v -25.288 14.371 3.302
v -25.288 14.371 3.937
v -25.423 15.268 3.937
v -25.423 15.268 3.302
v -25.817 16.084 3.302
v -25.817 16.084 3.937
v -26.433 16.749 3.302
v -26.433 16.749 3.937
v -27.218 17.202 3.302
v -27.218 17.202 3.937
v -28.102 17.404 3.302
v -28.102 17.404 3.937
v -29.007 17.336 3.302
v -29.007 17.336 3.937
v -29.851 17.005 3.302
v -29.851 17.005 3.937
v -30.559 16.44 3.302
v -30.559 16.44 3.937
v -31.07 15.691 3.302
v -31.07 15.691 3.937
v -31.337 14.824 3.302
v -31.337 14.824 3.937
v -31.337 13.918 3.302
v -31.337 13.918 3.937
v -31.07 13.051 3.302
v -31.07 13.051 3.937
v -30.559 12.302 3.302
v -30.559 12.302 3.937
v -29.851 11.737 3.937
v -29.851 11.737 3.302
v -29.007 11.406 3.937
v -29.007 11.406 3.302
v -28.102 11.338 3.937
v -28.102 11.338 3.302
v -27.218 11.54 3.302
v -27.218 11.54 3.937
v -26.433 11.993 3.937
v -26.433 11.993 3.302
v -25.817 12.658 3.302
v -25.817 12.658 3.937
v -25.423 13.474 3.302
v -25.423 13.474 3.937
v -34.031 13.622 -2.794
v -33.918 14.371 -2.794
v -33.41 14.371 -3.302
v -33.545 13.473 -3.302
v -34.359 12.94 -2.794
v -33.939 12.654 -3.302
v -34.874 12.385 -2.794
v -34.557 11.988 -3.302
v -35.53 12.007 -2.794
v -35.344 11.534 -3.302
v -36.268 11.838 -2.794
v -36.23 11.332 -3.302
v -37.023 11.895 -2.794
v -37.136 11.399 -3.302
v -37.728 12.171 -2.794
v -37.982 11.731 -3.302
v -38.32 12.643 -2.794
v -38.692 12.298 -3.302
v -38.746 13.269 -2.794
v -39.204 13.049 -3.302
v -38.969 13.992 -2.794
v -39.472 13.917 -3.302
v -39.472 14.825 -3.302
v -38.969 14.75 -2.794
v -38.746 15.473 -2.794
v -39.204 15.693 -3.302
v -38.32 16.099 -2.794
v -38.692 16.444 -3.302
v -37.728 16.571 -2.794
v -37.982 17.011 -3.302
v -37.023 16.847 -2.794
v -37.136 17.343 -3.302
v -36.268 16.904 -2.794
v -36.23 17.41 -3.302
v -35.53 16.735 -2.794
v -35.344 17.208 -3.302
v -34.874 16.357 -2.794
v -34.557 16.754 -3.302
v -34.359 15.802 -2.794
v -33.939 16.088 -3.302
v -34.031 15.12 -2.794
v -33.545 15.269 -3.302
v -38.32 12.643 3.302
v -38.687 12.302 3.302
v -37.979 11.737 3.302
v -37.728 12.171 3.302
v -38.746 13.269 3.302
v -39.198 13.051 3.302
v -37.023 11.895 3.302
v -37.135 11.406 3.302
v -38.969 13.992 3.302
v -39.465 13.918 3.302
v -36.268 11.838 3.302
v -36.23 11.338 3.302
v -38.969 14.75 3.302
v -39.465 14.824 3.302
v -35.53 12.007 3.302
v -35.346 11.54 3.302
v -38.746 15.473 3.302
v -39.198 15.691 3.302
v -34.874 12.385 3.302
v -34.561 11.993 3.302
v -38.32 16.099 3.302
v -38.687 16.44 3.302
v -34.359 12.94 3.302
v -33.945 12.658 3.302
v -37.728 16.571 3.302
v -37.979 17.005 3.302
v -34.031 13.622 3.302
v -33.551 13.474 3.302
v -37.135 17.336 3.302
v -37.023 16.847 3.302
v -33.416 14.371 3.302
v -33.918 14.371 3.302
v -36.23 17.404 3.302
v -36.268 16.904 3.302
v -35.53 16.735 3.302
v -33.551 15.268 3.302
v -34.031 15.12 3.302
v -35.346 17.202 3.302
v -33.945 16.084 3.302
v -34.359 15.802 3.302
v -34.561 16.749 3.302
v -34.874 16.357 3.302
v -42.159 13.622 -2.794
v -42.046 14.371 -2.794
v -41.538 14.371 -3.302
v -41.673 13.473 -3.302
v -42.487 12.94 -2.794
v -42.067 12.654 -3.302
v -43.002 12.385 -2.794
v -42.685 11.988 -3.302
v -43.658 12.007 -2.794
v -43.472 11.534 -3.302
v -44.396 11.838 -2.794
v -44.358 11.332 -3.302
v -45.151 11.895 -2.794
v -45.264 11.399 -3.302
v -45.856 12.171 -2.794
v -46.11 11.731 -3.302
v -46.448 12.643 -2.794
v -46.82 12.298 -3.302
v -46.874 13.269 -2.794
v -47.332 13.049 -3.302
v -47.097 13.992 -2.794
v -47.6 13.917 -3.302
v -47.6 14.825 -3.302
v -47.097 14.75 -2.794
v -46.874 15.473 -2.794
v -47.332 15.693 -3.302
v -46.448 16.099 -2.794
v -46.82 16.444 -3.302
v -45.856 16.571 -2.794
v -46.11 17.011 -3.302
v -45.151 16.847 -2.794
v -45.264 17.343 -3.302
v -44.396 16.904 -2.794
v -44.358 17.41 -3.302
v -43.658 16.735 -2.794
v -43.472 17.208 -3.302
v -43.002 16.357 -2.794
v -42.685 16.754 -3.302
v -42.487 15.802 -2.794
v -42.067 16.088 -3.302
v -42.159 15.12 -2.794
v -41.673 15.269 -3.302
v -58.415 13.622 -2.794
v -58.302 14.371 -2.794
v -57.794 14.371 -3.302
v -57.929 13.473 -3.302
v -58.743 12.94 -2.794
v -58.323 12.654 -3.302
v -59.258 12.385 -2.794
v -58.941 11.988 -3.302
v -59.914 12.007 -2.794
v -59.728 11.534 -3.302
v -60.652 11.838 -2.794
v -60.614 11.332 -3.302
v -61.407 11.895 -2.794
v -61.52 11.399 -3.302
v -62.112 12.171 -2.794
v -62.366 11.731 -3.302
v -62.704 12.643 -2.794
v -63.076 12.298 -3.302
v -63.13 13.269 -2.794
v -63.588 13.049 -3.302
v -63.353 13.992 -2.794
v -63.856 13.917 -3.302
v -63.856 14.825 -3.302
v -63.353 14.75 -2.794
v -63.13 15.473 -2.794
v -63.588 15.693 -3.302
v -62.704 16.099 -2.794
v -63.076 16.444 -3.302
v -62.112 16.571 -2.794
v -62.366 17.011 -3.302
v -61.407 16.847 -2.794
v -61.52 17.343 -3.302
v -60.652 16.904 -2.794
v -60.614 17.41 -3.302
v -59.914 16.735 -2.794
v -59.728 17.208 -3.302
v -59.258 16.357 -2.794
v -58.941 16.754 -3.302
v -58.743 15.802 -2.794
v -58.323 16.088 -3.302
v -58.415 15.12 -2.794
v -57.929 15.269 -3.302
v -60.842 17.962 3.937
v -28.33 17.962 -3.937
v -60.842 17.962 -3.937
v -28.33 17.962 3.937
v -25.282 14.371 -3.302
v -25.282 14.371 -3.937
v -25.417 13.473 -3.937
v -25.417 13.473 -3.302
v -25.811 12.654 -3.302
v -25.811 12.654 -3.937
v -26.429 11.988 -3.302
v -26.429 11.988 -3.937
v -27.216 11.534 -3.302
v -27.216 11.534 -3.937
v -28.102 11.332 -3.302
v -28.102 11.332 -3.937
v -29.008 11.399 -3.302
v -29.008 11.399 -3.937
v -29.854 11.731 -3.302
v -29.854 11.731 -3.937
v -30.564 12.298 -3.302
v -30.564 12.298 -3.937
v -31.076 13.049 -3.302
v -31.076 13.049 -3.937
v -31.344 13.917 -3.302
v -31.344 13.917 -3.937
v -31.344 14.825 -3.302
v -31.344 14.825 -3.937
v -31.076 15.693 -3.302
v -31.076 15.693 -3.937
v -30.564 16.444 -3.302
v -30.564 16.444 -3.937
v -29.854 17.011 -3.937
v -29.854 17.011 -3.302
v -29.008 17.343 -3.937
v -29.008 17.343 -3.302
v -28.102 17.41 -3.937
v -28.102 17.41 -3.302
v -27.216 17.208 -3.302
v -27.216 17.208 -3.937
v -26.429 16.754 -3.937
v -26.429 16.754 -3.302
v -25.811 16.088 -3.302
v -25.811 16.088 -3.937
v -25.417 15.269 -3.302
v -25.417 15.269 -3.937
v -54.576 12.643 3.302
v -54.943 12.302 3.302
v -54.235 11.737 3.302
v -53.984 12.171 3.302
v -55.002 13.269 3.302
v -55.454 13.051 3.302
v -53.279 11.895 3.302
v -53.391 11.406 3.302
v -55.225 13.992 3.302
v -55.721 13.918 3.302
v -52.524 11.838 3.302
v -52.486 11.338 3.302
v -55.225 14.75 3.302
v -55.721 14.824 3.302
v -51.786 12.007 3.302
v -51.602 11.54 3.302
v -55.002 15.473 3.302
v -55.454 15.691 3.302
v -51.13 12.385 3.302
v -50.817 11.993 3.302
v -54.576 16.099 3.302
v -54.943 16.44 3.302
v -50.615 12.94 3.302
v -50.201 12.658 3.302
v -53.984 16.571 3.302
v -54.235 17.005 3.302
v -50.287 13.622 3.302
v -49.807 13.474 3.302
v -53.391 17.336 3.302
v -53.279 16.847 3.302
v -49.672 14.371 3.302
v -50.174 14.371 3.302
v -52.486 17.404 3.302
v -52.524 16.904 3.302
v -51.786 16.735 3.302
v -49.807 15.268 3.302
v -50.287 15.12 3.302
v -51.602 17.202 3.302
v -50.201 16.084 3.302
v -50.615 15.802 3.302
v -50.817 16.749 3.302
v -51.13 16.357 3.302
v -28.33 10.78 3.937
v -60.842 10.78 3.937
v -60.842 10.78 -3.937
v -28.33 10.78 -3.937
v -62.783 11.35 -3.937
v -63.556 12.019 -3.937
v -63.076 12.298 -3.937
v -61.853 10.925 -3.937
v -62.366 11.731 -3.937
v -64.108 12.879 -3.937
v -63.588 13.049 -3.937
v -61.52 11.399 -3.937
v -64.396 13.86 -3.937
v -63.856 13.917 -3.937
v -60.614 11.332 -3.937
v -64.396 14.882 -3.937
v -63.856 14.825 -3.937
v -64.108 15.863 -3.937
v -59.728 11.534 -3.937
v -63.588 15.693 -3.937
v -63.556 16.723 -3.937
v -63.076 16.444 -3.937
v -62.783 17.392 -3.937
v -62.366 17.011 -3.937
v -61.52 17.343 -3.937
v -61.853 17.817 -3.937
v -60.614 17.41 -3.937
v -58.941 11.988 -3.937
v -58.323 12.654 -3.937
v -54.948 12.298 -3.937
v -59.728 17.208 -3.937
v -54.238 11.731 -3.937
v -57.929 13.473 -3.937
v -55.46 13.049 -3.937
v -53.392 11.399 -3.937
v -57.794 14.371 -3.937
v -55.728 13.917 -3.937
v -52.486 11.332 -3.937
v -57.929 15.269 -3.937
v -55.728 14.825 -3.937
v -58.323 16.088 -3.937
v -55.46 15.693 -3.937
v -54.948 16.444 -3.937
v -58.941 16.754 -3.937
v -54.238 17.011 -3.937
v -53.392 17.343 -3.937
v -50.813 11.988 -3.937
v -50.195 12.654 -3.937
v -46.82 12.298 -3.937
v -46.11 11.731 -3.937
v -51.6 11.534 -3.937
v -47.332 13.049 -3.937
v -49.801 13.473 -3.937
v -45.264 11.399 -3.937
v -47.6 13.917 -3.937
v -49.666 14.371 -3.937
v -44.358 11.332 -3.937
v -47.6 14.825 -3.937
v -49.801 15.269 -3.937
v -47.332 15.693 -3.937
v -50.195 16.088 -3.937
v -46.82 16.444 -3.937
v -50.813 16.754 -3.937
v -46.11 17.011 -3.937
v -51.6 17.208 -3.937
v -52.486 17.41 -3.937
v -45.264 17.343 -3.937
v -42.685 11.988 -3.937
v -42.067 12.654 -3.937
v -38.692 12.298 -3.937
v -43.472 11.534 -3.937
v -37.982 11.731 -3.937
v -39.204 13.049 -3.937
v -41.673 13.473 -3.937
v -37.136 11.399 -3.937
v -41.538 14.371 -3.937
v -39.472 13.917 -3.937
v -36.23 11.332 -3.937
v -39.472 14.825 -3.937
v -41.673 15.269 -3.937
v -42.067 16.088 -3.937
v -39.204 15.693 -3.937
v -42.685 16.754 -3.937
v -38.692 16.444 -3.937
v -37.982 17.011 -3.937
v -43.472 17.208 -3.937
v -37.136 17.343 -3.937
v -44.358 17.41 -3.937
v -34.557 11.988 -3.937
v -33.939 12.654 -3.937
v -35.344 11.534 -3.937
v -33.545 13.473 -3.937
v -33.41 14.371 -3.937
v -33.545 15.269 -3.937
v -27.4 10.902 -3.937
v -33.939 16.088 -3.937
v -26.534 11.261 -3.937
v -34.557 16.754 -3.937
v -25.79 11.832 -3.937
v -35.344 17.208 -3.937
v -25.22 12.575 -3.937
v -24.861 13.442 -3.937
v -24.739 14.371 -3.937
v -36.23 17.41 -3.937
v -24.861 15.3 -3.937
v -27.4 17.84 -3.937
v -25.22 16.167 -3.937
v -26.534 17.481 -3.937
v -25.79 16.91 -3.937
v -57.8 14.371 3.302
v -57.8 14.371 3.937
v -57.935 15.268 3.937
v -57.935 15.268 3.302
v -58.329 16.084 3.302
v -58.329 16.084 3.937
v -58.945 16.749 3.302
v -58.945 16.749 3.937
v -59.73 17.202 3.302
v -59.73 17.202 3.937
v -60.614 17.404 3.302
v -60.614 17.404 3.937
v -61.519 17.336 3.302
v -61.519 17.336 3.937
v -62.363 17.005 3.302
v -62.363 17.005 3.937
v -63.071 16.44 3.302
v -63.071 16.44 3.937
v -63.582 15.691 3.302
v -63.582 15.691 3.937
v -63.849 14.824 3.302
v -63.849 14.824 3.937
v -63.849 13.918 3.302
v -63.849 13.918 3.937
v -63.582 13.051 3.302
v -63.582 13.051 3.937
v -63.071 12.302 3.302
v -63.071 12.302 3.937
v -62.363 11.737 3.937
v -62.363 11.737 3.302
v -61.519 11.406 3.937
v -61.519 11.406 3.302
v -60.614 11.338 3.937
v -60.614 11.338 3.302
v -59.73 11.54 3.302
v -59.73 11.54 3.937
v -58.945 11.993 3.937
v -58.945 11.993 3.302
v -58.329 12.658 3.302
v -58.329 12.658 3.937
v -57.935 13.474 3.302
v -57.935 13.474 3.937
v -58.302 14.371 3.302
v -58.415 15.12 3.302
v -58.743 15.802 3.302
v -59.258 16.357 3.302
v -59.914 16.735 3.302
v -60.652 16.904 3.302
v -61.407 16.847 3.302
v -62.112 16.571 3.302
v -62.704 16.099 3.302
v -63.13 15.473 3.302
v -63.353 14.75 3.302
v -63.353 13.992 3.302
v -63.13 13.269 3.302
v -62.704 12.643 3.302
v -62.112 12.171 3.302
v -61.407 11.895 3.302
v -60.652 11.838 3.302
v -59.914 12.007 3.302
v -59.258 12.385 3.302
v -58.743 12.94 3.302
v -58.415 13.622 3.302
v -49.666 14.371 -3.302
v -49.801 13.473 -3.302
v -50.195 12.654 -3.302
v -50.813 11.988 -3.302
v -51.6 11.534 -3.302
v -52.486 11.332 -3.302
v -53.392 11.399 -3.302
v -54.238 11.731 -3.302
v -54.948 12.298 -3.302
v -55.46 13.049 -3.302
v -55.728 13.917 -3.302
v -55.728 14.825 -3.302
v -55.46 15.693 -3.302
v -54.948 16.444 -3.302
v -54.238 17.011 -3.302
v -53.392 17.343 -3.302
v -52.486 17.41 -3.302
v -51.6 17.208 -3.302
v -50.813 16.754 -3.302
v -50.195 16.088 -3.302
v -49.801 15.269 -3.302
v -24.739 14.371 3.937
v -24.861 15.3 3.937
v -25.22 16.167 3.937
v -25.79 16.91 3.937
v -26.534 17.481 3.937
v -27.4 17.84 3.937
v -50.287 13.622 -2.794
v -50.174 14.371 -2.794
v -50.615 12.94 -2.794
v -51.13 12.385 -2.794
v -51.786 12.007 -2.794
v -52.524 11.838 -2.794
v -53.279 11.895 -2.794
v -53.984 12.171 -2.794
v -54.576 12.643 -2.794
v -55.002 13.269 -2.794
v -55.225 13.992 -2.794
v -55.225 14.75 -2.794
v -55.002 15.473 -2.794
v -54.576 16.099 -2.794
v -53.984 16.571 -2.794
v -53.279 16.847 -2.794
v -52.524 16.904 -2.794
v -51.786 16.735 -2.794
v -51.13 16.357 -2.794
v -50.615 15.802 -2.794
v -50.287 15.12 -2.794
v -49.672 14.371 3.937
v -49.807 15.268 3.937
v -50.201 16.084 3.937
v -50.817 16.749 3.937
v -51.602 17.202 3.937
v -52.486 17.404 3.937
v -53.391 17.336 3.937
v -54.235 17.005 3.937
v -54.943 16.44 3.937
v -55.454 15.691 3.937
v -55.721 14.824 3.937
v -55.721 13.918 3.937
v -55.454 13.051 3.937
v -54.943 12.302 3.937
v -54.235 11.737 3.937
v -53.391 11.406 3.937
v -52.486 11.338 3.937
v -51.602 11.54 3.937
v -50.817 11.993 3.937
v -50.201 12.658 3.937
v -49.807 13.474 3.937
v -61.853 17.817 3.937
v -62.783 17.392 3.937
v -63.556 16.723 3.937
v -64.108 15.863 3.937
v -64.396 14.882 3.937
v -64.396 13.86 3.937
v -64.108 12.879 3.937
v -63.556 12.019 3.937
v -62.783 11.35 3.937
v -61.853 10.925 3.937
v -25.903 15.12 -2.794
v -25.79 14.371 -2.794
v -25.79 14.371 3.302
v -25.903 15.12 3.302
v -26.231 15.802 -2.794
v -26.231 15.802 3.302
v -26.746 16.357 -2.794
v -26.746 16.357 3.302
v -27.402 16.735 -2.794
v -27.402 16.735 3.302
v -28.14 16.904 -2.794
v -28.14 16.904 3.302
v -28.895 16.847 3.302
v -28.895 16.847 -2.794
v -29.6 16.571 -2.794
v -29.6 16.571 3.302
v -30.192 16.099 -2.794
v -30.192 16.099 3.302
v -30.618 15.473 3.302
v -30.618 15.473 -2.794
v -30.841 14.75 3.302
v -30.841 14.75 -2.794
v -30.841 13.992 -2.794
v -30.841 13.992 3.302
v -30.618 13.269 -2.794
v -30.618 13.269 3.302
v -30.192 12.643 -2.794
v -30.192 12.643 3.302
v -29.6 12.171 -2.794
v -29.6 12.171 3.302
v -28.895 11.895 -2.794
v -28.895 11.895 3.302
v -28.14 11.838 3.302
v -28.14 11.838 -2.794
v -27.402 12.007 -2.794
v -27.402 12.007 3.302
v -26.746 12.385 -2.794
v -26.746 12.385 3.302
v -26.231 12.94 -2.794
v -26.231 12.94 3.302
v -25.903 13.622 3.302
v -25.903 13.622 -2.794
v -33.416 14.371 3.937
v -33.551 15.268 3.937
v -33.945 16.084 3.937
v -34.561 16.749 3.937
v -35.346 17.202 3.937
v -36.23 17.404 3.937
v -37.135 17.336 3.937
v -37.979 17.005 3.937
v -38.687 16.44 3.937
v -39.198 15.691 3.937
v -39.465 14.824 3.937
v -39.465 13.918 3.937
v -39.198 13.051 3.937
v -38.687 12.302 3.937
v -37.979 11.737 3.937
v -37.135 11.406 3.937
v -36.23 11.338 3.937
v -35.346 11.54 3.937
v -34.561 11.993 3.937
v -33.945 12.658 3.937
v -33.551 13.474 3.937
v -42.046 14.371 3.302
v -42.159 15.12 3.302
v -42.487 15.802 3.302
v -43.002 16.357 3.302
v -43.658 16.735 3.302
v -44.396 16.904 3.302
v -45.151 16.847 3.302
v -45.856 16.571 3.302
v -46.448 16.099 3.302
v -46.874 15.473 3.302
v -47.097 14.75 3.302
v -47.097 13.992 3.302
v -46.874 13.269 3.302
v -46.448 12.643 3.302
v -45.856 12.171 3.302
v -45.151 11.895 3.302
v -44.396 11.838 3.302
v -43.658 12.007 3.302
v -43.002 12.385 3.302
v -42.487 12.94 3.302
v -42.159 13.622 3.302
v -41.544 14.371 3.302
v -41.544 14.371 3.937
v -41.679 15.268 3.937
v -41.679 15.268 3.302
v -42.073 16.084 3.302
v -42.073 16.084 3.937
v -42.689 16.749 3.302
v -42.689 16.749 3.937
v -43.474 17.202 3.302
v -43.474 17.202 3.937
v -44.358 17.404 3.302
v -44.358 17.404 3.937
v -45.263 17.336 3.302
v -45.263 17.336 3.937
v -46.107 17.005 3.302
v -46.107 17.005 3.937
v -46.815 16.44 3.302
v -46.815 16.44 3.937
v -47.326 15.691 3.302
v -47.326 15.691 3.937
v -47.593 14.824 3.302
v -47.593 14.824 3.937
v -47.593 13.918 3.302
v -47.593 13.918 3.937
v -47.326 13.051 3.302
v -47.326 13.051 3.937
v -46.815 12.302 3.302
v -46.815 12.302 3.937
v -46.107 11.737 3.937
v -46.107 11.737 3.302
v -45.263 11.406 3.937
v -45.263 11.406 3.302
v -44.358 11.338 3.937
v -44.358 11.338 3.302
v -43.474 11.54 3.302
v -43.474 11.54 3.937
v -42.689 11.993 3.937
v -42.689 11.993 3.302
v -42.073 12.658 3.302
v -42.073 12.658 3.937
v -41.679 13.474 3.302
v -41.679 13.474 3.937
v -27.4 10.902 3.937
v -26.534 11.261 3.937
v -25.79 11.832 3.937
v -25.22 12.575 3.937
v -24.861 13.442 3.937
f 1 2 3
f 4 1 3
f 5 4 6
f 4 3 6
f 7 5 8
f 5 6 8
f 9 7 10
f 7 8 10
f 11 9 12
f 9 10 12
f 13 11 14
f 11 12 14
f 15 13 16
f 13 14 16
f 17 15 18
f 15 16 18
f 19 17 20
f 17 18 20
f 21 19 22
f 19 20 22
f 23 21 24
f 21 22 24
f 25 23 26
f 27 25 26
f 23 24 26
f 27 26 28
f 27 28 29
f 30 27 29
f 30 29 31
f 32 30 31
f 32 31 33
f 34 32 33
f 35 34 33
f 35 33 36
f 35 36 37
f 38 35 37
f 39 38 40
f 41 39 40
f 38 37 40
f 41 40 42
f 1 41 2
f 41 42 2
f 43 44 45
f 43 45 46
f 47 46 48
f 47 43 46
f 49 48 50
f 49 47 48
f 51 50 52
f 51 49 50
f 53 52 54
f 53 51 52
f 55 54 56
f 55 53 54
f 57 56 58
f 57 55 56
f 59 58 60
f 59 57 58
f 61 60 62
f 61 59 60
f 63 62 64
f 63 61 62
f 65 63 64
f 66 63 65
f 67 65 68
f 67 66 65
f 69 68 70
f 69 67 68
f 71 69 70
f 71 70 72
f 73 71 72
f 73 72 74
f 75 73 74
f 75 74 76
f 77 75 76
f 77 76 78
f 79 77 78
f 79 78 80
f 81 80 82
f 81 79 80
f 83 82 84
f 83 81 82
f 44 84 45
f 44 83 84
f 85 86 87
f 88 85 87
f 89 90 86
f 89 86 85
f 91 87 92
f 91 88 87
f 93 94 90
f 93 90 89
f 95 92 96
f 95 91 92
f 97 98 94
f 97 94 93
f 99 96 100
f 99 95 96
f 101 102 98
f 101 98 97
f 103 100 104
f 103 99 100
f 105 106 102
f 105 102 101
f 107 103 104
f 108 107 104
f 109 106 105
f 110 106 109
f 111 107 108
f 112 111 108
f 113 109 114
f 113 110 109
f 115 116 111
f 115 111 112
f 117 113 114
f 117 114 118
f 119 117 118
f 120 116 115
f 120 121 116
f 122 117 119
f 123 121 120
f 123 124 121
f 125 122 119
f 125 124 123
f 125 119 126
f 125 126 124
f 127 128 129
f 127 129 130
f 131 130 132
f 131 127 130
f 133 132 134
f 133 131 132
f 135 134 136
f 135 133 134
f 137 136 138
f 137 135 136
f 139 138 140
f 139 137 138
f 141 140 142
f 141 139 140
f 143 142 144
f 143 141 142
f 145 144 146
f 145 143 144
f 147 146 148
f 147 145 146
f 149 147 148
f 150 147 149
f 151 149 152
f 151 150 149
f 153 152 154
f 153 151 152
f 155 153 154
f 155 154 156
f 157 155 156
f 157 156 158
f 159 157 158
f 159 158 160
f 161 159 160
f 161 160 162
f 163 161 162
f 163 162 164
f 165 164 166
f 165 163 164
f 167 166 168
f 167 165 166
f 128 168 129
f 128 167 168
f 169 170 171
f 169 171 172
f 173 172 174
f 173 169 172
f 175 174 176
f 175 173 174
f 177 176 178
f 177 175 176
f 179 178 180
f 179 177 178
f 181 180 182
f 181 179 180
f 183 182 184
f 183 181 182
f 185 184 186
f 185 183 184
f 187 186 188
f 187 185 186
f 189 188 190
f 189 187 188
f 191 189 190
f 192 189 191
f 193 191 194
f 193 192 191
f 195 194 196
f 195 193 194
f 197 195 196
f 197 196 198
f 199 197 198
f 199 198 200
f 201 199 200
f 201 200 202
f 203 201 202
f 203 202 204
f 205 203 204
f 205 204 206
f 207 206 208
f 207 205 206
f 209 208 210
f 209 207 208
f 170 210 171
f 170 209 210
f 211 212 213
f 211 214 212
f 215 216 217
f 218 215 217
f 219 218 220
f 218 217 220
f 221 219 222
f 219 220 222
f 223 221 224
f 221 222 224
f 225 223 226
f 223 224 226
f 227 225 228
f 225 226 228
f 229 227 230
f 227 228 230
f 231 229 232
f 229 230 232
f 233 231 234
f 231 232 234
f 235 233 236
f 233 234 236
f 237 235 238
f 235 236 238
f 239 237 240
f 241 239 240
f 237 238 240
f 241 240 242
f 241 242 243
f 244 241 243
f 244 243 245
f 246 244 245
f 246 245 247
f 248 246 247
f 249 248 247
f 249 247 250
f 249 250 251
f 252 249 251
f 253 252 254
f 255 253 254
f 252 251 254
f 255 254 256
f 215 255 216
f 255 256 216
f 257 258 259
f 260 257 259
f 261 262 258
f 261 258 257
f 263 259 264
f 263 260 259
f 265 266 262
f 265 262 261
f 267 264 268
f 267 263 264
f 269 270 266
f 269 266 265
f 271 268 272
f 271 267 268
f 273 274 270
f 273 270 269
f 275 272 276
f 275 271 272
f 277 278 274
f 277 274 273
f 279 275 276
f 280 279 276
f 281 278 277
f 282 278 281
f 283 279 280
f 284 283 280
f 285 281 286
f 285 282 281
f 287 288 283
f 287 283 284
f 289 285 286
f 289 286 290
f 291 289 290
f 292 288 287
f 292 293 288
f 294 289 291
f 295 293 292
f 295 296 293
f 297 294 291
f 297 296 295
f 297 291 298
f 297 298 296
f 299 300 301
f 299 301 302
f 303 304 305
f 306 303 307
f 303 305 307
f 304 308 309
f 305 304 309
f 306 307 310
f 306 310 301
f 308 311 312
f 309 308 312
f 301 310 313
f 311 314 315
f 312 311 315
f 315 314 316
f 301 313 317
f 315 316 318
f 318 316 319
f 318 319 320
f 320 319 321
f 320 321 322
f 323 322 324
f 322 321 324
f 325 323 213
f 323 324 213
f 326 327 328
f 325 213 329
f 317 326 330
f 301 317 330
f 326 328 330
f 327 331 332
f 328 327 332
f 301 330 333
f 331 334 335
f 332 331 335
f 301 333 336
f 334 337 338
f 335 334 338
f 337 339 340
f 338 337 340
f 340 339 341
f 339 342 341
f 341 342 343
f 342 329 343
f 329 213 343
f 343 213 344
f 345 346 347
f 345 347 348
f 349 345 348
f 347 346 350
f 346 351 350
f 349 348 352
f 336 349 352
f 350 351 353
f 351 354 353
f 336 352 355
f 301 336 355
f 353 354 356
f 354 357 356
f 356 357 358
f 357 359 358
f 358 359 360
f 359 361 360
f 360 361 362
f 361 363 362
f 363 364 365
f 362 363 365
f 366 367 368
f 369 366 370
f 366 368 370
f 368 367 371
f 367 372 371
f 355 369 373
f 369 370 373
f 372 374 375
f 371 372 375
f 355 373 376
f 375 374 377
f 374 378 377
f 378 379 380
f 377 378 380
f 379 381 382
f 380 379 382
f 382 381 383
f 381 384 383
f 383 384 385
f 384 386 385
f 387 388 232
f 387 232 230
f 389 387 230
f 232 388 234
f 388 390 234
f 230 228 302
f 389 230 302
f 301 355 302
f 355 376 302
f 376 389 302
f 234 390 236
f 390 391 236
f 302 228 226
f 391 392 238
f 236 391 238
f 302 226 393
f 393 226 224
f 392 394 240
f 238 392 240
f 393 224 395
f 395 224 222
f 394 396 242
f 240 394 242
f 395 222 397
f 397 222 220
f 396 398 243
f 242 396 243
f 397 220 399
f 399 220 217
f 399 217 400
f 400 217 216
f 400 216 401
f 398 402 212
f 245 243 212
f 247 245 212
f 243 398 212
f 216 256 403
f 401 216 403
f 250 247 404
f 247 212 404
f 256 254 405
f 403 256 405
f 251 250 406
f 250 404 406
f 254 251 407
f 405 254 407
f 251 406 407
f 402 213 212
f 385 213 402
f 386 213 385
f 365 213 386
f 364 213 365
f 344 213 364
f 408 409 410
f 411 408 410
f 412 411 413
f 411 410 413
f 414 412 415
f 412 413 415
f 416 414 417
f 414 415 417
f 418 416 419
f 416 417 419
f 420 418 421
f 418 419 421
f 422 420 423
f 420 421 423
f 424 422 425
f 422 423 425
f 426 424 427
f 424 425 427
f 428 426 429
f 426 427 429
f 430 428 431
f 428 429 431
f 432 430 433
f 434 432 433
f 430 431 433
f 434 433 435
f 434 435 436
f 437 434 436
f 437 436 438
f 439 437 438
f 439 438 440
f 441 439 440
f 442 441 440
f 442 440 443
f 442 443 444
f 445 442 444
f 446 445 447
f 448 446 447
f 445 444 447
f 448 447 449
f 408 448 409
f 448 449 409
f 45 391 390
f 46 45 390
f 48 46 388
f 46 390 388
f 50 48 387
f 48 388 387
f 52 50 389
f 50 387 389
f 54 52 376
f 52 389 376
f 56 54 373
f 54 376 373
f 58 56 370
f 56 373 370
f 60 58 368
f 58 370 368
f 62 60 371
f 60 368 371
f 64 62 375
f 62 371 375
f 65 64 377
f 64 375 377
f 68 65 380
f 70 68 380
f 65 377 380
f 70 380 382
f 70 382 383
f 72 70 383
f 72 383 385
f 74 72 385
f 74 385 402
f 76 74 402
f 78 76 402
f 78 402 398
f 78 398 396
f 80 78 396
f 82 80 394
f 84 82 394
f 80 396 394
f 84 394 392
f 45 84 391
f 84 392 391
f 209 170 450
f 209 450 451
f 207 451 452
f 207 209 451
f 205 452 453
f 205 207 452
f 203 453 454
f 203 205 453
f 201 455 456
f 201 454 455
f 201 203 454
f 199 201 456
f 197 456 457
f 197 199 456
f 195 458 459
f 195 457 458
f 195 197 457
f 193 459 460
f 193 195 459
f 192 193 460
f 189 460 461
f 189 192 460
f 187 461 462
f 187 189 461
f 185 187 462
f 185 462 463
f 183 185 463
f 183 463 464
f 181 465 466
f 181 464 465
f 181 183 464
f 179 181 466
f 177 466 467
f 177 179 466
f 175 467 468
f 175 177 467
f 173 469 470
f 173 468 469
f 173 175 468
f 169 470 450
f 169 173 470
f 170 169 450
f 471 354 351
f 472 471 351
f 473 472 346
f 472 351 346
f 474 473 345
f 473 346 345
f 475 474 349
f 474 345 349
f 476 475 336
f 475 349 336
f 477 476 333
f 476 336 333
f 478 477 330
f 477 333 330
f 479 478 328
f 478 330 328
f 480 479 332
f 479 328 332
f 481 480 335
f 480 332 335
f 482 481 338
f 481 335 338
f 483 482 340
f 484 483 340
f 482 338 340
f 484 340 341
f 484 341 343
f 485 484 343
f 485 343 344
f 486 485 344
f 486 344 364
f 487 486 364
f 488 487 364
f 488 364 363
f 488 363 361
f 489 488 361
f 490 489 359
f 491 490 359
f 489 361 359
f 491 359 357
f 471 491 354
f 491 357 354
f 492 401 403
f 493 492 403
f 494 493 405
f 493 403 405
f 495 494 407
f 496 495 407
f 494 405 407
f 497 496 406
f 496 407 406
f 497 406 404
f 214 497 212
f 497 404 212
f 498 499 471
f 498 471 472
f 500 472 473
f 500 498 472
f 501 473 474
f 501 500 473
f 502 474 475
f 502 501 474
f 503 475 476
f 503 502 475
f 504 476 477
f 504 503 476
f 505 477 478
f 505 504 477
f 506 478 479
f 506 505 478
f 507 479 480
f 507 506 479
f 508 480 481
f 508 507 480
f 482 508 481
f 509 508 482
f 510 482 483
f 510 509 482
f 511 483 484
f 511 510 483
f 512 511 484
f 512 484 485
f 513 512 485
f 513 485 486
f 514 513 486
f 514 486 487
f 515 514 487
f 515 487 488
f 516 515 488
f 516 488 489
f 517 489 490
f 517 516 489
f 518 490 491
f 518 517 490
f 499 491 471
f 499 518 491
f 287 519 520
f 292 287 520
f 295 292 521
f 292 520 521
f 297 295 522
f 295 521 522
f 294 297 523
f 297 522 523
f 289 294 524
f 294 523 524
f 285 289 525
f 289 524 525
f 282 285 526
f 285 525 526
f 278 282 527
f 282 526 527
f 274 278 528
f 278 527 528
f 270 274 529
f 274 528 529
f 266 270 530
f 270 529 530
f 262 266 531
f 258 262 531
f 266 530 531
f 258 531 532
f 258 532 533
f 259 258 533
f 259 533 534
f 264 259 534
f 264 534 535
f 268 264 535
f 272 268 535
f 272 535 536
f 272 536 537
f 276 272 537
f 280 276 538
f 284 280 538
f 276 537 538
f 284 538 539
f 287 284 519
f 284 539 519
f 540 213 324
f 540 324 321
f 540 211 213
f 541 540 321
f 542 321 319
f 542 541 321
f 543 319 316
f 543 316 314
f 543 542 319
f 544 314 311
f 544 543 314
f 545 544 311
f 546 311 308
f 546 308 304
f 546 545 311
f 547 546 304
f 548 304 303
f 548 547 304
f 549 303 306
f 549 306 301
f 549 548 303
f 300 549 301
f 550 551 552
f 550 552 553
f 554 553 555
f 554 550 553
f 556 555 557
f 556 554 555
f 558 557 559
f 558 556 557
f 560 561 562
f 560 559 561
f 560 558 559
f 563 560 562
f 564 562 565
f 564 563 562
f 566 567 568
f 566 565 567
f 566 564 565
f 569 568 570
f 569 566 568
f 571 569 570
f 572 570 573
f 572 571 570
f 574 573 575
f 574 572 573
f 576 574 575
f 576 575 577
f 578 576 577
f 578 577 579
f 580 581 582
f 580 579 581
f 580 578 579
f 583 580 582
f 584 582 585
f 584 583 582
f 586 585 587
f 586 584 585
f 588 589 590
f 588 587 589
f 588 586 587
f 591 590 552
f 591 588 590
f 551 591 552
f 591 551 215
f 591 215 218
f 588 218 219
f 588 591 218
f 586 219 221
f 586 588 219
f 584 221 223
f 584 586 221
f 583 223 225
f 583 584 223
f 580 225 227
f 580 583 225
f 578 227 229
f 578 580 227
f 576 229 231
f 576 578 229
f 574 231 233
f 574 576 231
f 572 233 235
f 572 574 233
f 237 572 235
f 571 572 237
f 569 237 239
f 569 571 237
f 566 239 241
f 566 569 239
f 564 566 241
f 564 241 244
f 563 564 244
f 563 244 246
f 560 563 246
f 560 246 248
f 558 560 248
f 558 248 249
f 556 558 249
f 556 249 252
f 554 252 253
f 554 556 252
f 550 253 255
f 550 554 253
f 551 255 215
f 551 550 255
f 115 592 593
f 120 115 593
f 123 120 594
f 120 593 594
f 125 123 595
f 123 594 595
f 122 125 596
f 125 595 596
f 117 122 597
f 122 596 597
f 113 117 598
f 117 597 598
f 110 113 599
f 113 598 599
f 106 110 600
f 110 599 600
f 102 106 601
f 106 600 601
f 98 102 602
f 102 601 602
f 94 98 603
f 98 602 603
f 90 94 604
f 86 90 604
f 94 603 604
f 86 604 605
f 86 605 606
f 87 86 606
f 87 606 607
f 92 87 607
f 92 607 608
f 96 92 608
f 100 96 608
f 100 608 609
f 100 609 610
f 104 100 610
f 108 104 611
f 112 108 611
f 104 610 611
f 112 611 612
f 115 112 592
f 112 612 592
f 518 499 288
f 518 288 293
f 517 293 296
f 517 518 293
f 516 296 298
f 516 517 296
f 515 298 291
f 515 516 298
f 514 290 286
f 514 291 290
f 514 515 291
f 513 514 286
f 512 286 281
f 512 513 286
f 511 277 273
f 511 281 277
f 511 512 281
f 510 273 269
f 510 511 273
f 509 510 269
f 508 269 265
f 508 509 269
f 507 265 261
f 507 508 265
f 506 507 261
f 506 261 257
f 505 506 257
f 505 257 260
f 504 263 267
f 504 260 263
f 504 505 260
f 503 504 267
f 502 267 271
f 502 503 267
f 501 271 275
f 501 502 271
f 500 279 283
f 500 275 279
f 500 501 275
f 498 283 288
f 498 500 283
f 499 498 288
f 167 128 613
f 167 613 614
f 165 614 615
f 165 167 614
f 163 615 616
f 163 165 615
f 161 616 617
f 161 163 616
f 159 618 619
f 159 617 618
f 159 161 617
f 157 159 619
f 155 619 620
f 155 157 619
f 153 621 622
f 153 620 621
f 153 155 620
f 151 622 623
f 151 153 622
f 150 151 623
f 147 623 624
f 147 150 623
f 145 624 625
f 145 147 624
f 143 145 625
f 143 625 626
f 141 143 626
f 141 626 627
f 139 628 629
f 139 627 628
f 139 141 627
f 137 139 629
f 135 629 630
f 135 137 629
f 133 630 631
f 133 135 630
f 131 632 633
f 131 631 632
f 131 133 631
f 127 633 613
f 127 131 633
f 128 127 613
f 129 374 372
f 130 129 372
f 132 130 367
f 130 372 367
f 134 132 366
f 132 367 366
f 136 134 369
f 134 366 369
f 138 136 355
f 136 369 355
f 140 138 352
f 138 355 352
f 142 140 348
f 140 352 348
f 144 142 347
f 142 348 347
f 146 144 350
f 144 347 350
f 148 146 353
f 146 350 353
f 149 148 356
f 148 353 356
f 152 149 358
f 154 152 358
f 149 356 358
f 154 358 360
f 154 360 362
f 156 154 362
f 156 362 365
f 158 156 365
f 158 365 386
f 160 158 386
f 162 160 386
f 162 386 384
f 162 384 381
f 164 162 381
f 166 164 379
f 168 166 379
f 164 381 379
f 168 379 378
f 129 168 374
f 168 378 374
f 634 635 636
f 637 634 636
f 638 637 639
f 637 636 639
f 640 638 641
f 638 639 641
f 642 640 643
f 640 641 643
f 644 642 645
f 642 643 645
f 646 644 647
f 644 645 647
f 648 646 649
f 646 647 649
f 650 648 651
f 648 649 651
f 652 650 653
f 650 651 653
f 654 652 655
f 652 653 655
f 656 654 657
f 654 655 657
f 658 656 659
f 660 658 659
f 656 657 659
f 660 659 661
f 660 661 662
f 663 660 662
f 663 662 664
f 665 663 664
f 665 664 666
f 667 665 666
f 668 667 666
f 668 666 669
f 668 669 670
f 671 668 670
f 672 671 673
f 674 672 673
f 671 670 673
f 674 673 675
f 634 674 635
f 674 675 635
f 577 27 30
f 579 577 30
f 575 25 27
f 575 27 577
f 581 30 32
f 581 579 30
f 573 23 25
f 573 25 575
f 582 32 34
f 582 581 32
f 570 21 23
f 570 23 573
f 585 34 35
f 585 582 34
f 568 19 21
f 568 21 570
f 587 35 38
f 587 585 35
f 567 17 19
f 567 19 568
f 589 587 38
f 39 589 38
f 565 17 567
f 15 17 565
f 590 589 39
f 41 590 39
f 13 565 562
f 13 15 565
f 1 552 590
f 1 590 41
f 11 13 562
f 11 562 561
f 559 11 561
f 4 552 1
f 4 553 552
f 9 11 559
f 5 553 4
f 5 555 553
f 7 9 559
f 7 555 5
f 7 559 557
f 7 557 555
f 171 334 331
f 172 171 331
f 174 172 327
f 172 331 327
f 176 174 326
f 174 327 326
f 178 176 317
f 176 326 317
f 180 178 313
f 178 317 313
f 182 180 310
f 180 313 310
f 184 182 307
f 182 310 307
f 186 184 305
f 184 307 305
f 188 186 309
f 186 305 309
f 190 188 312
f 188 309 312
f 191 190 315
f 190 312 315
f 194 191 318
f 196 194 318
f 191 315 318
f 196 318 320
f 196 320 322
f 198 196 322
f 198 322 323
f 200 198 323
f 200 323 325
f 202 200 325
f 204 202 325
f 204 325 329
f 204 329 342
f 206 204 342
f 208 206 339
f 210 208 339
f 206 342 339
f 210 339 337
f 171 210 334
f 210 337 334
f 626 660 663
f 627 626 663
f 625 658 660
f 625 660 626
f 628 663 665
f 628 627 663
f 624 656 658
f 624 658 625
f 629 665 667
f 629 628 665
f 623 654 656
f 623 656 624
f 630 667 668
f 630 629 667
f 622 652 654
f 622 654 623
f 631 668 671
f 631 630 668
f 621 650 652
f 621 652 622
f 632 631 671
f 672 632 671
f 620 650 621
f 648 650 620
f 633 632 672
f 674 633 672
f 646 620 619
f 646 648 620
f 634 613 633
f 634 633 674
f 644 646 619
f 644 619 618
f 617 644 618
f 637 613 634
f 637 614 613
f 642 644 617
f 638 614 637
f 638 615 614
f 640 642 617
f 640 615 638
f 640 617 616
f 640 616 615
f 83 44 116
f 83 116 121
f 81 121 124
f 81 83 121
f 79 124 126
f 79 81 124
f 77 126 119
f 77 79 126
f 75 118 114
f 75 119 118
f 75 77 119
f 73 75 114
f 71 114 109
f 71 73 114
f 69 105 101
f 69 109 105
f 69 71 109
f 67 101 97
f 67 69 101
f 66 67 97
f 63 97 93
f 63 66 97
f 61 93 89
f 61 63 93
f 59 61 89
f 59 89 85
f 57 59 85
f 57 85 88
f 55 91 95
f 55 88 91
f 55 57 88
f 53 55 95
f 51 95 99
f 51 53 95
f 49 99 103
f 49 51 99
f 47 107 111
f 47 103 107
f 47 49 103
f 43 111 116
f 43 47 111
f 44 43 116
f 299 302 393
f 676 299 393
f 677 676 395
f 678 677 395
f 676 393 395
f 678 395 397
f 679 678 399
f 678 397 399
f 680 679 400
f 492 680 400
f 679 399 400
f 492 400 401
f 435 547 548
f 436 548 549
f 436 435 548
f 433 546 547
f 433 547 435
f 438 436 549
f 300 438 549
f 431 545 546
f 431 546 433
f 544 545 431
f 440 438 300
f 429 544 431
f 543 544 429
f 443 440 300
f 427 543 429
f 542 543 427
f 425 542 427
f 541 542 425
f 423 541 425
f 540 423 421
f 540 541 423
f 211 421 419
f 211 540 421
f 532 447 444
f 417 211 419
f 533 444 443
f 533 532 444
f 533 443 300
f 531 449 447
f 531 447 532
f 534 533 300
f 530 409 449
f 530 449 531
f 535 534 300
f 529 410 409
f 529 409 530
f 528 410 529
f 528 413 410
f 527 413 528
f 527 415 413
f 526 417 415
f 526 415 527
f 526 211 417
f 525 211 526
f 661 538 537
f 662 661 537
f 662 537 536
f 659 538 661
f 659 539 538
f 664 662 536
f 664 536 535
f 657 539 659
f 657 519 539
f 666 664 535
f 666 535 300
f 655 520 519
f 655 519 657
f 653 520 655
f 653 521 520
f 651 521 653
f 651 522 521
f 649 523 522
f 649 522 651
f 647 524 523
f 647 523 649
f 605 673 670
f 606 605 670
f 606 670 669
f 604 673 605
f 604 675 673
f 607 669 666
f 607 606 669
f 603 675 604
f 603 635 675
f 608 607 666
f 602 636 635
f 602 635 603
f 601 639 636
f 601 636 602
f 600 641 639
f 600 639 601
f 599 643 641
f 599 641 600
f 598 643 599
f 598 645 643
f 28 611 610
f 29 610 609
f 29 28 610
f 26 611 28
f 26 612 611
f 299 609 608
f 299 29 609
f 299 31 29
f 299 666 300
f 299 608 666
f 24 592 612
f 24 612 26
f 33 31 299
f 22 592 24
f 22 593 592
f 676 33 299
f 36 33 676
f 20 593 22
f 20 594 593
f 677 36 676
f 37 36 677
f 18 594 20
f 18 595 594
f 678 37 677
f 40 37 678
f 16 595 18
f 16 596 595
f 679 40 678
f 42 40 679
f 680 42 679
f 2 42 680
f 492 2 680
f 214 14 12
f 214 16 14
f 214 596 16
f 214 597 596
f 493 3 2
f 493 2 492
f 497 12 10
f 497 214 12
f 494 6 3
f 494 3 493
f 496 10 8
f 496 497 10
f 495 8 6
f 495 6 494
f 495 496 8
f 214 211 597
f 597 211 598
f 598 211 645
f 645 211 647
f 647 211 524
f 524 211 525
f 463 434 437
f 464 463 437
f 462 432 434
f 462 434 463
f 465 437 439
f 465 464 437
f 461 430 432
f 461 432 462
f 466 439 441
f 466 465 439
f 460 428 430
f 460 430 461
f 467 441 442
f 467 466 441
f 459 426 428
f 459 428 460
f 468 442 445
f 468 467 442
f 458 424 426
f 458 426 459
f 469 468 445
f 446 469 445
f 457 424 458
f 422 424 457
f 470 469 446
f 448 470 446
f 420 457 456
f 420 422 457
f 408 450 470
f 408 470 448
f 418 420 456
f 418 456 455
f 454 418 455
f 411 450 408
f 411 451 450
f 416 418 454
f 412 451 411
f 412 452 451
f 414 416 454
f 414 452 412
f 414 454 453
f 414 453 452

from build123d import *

# Parameters (mm, degrees)
F0_R     = 3.048
F0_R_2   = 2.54
F1_DEPTH = 3.937
F2_R     = 3.0417071759
F3_DEPTH = 0.635
F4_R     = 3.048
F5_DEPTH = 0.635
F6_SIZE2 = 0.50799
F6_SIZE  = 0.50799
F7_SIZE2 = 0.50799
F7_SIZE  = 0.50799


# Not quite as in the source:
# - a fillet or chamfer is up to 0.001 mm smaller than in the source, because OpenCascade refuses the exact size


with BuildPart() as f1:
    # F0 (on Top) → F1 (new body, symmetric)
    with BuildSketch(Plane.XY):
        with BuildLine():
            ThreePointArc((-40.9946195992, 14.3710068385), (-42.0464330806, 16.9103092103), (-44.5857354524, 17.9621226917))
            ThreePointArc((-44.5857354524, 17.9621226917), (-48.1768513056, 14.3710068385), (-44.5857354524, 10.7798909853))
            ThreePointArc((-44.5857354524, 10.7798909853), (-42.0464330806, 11.8317044667), (-40.9946195992, 14.3710068385))
        make_face()
        with Locations((-44.5857354524, 14.3710068385)):
            Circle(F0_R, mode=Mode.SUBTRACT)
        with BuildLine():
            ThreePointArc((-49.1226195992, 14.3710068385), (-50.1744330806, 16.9103092103), (-52.7137354524, 17.9621226917))
            ThreePointArc((-52.7137354524, 17.9621226917), (-56.3048513056, 14.3710068385), (-52.7137354524, 10.7798909853))
            ThreePointArc((-52.7137354524, 10.7798909853), (-50.1744330806, 11.8317044667), (-49.1226195992, 14.3710068385))
        make_face()
        with Locations((-52.7137354524, 14.3710068385)):
            Circle(F0_R, mode=Mode.SUBTRACT)
        with BuildLine():
            ThreePointArc((-32.8666195992, 14.3710068385), (-33.9184330806, 16.9103092103), (-36.4577354524, 17.9621226917))
            ThreePointArc((-36.4577354524, 17.9621226917), (-40.0488513056, 14.3710068385), (-36.4577354524, 10.7798909853))
            ThreePointArc((-36.4577354524, 10.7798909853), (-33.9184330806, 11.8317044667), (-32.8666195992, 14.3710068385))
        make_face()
        with Locations((-36.4577354524, 14.3710068385)):
            Circle(F0_R, mode=Mode.SUBTRACT)
        with BuildLine():
            ThreePointArc((-24.7386195992, 14.3710068385), (-25.7904330806, 16.9103092103), (-28.3297354524, 17.9621226917))
            ThreePointArc((-28.3297354524, 17.9621226917), (-31.9208513056, 14.3710068385), (-28.3297354524, 10.7798909853))
            ThreePointArc((-28.3297354524, 10.7798909853), (-25.7904330806, 11.8317044667), (-24.7386195992, 14.3710068385))
        make_face()
        with Locations((-28.3297354524, 14.3710068385)):
            Circle(F0_R, mode=Mode.SUBTRACT)
        with BuildLine():
            ThreePointArc((-60.8417354524, 10.7798909853), (-58.3024330806, 11.8317044667), (-57.2506195992, 14.3710068385))
            ThreePointArc((-57.2506195992, 14.3710068385), (-58.3024330806, 16.9103092103), (-60.8417354524, 17.9621226917))
            ThreePointArc((-60.8417354524, 17.9621226917), (-64.4328513056, 14.3710068385), (-60.8417354524, 10.7798909853))
        make_face()
        with Locations((-60.8417354524, 14.3710068385)):
            Circle(F0_R, mode=Mode.SUBTRACT)
        with Locations((-44.5857354524, 14.3710068385)):
            Circle(F0_R)
        with Locations((-44.5857354524, 14.3710068385)):
            Circle(F0_R_2, mode=Mode.SUBTRACT)
        with Locations((-36.4577354524, 14.3710068385)):
            Circle(F0_R)
        with Locations((-36.4577354524, 14.3710068385)):
            Circle(F0_R_2, mode=Mode.SUBTRACT)
        with Locations((-52.7137354524, 14.3710068385)):
            Circle(F0_R)
        with Locations((-52.7137354524, 14.3710068385)):
            Circle(F0_R_2, mode=Mode.SUBTRACT)
        with Locations((-28.3297354524, 14.3710068385)):
            Circle(F0_R)
        with Locations((-28.3297354524, 14.3710068385)):
            Circle(F0_R_2, mode=Mode.SUBTRACT)
        with Locations((-60.8417354524, 14.3710068385)):
            Circle(F0_R)
        with Locations((-60.8417354524, 14.3710068385)):
            Circle(F0_R_2, mode=Mode.SUBTRACT)
        with BuildLine():
            ThreePointArc((-60.8417354524, 17.9621226917), (-58.3024330806, 16.9103092103), (-57.2506195992, 14.3710068385))
            ThreePointArc((-57.2506195992, 14.3710068385), (-58.3024330806, 11.8317044667), (-60.8417354524, 10.7798909853))
            Line((-60.8417354524, 10.7798909853), (-52.7137354524, 10.7798909853))
            ThreePointArc((-52.7137354524, 10.7798909853), (-56.3048513056, 14.3710068385), (-52.7137354524, 17.9621226917))
            Line((-52.7137354524, 17.9621226917), (-60.8417354524, 17.9621226917))
        make_face()
        with BuildLine():
            Line((-44.5857354524, 17.9621226917), (-52.7137354524, 17.9621226917))
            ThreePointArc((-52.7137354524, 17.9621226917), (-50.1744330806, 16.9103092103), (-49.1226195992, 14.3710068385))
            ThreePointArc((-49.1226195992, 14.3710068385), (-50.1744330806, 11.8317044667), (-52.7137354524, 10.7798909853))
            Line((-52.7137354524, 10.7798909853), (-44.5857354524, 10.7798909853))
            ThreePointArc((-44.5857354524, 10.7798909853), (-48.1768513056, 14.3710068385), (-44.5857354524, 17.9621226917))
        make_face()
        with BuildLine():
            Line((-28.3297354524, 17.9621226917), (-36.4577354524, 17.9621226917))
            ThreePointArc((-36.4577354524, 17.9621226917), (-33.9184330806, 16.9103092103), (-32.8666195992, 14.3710068385))
            ThreePointArc((-32.8666195992, 14.3710068385), (-33.9184330806, 11.8317044667), (-36.4577354524, 10.7798909853))
            Line((-36.4577354524, 10.7798909853), (-28.3297354524, 10.7798909853))
            ThreePointArc((-28.3297354524, 10.7798909853), (-31.9208513056, 14.3710068385), (-28.3297354524, 17.9621226917))
        make_face()
        with BuildLine():
            Line((-36.4577354524, 17.9621226917), (-44.5857354524, 17.9621226917))
            ThreePointArc((-44.5857354524, 17.9621226917), (-42.0464330806, 16.9103092103), (-40.9946195992, 14.3710068385))
            ThreePointArc((-40.9946195992, 14.3710068385), (-42.0464330806, 11.8317044667), (-44.5857354524, 10.7798909853))
            Line((-44.5857354524, 10.7798909853), (-36.4577354524, 10.7798909853))
            ThreePointArc((-36.4577354524, 10.7798909853), (-40.0488513056, 14.3710068385), (-36.4577354524, 17.9621226917))
        make_face()
    extrude(amount=F1_DEPTH, both=True)

    # F2 (on face) → F3 (cut)
    with BuildSketch(Plane.XY.offset(3.937)):
        with Locations((-28.3297354524, 14.3710068385)):
            Circle(F2_R)
        with Locations((-36.4577354524, 14.3710068385)):
            Circle(F2_R)
        with Locations((-44.5857354524, 14.3710068385)):
            Circle(F2_R)
        with Locations((-52.7137354524, 14.3710068385)):
            Circle(F2_R)
        with Locations((-60.8417354524, 14.3710068385)):
            Circle(F2_R)
    extrude(amount=-F3_DEPTH, mode=Mode.SUBTRACT)

    # F4 (on face) → F5 (cut)
    with BuildSketch(Plane(origin=(0, 0, -3.937), x_dir=(1, 0, 0), z_dir=(0, 0, -1))):
        with Locations((-60.8417354524, -14.3710068385)):
            Circle(F4_R)
        with Locations((-52.7137354524, -14.3710068385)):
            Circle(F4_R)
        with Locations((-44.5857354524, -14.3710068385)):
            Circle(F4_R)
        with Locations((-36.4577354524, -14.3710068385)):
            Circle(F4_R)
        with Locations((-28.3297354524, -14.3710068385)):
            Circle(F4_R)
    extrude(amount=-F5_DEPTH, mode=Mode.SUBTRACT)

    # F6 (size 0.508 and 0.508 in the source; OpenCascade refuses exactly that, so slightly less here)
    f6_edges = [f1.edges().sort_by_distance(p)[0] for p in [
        (-38.997735, 14.371007, -3.302),
    ]]
    chamfer(f6_edges, length=F6_SIZE, length2=F6_SIZE2)

    # F7 (size 0.508 and 0.508 in the source; OpenCascade refuses exactly that, so slightly less here)
    f7_edges = [f1.edges().sort_by_distance(p)[0] for p in [
        (-47.125735, 14.371007, -3.302),
        (-55.253735, 14.371007, -3.302),
        (-63.381735, 14.371007, -3.302),
        (-30.869735, 14.371007, -3.302),
    ]]
    chamfer(f7_edges, length=F7_SIZE, length2=F7_SIZE2)


solid = f1.part
